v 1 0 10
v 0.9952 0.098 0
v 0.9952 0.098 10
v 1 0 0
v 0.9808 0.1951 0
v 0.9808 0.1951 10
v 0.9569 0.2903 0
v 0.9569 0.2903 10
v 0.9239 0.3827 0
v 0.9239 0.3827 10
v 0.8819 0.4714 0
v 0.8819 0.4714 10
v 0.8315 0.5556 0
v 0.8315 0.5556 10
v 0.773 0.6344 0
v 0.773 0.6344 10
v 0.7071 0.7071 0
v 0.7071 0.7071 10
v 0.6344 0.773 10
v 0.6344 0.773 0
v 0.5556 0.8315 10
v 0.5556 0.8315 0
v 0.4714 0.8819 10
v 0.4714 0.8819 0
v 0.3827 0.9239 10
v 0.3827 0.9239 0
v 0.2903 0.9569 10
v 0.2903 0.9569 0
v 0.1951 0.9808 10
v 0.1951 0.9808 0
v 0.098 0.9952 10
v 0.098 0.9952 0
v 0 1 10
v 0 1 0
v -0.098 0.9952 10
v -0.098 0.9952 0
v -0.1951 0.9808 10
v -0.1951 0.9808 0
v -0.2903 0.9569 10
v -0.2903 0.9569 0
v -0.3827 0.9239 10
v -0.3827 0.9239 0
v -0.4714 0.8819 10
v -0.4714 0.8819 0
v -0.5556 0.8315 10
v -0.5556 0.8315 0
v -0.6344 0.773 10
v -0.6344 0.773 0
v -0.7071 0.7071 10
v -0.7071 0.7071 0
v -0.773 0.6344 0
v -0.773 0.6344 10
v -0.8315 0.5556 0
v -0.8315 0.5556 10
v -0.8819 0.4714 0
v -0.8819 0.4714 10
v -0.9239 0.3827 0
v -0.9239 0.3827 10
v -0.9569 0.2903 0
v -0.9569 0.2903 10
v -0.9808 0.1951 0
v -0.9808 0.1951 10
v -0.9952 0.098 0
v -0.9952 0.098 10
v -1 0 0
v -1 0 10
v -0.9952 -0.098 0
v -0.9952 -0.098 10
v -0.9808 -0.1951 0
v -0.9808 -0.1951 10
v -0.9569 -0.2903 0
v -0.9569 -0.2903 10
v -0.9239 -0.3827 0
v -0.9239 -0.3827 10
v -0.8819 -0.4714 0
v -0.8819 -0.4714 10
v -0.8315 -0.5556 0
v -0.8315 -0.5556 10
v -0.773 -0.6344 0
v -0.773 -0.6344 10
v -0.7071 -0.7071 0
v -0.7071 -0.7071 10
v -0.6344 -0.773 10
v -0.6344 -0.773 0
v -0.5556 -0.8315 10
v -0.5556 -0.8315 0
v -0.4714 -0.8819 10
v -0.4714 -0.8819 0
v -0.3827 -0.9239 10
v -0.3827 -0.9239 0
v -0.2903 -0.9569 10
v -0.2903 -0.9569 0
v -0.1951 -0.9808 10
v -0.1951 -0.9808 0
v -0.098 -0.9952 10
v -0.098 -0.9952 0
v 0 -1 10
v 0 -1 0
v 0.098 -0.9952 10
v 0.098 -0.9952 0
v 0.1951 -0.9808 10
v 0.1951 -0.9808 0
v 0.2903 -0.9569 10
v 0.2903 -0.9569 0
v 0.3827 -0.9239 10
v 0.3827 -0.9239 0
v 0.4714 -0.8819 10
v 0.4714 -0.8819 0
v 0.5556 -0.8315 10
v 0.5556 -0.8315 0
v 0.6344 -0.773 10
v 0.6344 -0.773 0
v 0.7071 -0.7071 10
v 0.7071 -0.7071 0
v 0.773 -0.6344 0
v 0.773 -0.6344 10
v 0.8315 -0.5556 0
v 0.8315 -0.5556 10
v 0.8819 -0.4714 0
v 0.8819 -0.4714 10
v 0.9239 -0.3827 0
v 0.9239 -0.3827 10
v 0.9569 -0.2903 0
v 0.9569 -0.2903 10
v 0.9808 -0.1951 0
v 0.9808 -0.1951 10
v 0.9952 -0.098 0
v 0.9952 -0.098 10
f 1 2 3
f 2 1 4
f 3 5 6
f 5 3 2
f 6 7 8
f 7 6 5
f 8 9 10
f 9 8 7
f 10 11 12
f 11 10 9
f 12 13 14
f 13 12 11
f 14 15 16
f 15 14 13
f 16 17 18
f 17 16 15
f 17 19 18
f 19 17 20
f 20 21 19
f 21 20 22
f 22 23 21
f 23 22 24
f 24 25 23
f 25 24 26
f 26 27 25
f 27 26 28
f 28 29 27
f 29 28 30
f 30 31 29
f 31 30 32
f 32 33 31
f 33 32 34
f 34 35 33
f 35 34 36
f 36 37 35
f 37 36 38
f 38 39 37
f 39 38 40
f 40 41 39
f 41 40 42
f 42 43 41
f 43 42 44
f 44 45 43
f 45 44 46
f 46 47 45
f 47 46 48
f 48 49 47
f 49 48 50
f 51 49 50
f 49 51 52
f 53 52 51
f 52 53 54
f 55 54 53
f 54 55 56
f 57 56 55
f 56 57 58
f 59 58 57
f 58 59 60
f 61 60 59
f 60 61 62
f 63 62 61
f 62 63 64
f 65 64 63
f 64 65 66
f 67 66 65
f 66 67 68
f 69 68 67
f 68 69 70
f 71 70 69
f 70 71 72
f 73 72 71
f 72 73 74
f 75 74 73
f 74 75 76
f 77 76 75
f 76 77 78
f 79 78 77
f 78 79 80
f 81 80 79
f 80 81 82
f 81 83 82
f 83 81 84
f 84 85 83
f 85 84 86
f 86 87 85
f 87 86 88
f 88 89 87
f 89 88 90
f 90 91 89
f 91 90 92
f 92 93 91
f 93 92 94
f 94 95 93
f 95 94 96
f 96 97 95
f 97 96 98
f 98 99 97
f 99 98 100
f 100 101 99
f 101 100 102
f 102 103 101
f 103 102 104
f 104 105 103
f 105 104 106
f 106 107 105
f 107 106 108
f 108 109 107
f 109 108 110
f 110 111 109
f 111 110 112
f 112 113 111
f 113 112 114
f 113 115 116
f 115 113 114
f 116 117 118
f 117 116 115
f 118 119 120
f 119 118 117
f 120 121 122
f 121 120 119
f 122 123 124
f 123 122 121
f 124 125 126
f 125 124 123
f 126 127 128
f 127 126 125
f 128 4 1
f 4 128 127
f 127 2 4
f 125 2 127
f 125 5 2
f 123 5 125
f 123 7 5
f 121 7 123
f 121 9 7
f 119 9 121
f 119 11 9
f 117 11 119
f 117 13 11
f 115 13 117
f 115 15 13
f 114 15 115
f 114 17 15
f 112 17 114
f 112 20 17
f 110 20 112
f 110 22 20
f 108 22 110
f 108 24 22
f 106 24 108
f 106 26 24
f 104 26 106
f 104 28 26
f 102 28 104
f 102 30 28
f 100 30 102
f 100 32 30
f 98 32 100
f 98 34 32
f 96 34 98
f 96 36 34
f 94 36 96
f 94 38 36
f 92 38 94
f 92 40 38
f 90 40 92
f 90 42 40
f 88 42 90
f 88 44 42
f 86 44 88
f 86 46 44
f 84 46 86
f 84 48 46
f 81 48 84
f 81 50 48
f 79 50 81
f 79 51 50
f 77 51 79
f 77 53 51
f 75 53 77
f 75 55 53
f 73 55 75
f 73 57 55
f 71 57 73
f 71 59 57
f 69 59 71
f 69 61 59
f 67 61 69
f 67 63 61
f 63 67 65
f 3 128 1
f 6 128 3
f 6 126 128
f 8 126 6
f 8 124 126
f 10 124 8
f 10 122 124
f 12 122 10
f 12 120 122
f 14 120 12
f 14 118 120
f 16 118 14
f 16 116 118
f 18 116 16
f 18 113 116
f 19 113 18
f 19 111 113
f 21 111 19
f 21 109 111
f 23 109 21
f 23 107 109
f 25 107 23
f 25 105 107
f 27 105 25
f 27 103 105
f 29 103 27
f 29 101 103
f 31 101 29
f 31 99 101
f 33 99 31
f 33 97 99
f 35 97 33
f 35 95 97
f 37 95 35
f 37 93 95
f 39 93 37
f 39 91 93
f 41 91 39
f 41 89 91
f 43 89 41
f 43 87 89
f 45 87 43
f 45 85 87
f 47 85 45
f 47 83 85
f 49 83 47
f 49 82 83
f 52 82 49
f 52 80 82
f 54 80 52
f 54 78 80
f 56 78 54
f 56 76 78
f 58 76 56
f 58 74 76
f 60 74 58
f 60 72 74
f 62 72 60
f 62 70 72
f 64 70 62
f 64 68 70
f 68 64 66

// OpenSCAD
// Unit of length: Unit.MM
cylinder(h = 10.0, d = 2.0, center = false, $fn = 64);
